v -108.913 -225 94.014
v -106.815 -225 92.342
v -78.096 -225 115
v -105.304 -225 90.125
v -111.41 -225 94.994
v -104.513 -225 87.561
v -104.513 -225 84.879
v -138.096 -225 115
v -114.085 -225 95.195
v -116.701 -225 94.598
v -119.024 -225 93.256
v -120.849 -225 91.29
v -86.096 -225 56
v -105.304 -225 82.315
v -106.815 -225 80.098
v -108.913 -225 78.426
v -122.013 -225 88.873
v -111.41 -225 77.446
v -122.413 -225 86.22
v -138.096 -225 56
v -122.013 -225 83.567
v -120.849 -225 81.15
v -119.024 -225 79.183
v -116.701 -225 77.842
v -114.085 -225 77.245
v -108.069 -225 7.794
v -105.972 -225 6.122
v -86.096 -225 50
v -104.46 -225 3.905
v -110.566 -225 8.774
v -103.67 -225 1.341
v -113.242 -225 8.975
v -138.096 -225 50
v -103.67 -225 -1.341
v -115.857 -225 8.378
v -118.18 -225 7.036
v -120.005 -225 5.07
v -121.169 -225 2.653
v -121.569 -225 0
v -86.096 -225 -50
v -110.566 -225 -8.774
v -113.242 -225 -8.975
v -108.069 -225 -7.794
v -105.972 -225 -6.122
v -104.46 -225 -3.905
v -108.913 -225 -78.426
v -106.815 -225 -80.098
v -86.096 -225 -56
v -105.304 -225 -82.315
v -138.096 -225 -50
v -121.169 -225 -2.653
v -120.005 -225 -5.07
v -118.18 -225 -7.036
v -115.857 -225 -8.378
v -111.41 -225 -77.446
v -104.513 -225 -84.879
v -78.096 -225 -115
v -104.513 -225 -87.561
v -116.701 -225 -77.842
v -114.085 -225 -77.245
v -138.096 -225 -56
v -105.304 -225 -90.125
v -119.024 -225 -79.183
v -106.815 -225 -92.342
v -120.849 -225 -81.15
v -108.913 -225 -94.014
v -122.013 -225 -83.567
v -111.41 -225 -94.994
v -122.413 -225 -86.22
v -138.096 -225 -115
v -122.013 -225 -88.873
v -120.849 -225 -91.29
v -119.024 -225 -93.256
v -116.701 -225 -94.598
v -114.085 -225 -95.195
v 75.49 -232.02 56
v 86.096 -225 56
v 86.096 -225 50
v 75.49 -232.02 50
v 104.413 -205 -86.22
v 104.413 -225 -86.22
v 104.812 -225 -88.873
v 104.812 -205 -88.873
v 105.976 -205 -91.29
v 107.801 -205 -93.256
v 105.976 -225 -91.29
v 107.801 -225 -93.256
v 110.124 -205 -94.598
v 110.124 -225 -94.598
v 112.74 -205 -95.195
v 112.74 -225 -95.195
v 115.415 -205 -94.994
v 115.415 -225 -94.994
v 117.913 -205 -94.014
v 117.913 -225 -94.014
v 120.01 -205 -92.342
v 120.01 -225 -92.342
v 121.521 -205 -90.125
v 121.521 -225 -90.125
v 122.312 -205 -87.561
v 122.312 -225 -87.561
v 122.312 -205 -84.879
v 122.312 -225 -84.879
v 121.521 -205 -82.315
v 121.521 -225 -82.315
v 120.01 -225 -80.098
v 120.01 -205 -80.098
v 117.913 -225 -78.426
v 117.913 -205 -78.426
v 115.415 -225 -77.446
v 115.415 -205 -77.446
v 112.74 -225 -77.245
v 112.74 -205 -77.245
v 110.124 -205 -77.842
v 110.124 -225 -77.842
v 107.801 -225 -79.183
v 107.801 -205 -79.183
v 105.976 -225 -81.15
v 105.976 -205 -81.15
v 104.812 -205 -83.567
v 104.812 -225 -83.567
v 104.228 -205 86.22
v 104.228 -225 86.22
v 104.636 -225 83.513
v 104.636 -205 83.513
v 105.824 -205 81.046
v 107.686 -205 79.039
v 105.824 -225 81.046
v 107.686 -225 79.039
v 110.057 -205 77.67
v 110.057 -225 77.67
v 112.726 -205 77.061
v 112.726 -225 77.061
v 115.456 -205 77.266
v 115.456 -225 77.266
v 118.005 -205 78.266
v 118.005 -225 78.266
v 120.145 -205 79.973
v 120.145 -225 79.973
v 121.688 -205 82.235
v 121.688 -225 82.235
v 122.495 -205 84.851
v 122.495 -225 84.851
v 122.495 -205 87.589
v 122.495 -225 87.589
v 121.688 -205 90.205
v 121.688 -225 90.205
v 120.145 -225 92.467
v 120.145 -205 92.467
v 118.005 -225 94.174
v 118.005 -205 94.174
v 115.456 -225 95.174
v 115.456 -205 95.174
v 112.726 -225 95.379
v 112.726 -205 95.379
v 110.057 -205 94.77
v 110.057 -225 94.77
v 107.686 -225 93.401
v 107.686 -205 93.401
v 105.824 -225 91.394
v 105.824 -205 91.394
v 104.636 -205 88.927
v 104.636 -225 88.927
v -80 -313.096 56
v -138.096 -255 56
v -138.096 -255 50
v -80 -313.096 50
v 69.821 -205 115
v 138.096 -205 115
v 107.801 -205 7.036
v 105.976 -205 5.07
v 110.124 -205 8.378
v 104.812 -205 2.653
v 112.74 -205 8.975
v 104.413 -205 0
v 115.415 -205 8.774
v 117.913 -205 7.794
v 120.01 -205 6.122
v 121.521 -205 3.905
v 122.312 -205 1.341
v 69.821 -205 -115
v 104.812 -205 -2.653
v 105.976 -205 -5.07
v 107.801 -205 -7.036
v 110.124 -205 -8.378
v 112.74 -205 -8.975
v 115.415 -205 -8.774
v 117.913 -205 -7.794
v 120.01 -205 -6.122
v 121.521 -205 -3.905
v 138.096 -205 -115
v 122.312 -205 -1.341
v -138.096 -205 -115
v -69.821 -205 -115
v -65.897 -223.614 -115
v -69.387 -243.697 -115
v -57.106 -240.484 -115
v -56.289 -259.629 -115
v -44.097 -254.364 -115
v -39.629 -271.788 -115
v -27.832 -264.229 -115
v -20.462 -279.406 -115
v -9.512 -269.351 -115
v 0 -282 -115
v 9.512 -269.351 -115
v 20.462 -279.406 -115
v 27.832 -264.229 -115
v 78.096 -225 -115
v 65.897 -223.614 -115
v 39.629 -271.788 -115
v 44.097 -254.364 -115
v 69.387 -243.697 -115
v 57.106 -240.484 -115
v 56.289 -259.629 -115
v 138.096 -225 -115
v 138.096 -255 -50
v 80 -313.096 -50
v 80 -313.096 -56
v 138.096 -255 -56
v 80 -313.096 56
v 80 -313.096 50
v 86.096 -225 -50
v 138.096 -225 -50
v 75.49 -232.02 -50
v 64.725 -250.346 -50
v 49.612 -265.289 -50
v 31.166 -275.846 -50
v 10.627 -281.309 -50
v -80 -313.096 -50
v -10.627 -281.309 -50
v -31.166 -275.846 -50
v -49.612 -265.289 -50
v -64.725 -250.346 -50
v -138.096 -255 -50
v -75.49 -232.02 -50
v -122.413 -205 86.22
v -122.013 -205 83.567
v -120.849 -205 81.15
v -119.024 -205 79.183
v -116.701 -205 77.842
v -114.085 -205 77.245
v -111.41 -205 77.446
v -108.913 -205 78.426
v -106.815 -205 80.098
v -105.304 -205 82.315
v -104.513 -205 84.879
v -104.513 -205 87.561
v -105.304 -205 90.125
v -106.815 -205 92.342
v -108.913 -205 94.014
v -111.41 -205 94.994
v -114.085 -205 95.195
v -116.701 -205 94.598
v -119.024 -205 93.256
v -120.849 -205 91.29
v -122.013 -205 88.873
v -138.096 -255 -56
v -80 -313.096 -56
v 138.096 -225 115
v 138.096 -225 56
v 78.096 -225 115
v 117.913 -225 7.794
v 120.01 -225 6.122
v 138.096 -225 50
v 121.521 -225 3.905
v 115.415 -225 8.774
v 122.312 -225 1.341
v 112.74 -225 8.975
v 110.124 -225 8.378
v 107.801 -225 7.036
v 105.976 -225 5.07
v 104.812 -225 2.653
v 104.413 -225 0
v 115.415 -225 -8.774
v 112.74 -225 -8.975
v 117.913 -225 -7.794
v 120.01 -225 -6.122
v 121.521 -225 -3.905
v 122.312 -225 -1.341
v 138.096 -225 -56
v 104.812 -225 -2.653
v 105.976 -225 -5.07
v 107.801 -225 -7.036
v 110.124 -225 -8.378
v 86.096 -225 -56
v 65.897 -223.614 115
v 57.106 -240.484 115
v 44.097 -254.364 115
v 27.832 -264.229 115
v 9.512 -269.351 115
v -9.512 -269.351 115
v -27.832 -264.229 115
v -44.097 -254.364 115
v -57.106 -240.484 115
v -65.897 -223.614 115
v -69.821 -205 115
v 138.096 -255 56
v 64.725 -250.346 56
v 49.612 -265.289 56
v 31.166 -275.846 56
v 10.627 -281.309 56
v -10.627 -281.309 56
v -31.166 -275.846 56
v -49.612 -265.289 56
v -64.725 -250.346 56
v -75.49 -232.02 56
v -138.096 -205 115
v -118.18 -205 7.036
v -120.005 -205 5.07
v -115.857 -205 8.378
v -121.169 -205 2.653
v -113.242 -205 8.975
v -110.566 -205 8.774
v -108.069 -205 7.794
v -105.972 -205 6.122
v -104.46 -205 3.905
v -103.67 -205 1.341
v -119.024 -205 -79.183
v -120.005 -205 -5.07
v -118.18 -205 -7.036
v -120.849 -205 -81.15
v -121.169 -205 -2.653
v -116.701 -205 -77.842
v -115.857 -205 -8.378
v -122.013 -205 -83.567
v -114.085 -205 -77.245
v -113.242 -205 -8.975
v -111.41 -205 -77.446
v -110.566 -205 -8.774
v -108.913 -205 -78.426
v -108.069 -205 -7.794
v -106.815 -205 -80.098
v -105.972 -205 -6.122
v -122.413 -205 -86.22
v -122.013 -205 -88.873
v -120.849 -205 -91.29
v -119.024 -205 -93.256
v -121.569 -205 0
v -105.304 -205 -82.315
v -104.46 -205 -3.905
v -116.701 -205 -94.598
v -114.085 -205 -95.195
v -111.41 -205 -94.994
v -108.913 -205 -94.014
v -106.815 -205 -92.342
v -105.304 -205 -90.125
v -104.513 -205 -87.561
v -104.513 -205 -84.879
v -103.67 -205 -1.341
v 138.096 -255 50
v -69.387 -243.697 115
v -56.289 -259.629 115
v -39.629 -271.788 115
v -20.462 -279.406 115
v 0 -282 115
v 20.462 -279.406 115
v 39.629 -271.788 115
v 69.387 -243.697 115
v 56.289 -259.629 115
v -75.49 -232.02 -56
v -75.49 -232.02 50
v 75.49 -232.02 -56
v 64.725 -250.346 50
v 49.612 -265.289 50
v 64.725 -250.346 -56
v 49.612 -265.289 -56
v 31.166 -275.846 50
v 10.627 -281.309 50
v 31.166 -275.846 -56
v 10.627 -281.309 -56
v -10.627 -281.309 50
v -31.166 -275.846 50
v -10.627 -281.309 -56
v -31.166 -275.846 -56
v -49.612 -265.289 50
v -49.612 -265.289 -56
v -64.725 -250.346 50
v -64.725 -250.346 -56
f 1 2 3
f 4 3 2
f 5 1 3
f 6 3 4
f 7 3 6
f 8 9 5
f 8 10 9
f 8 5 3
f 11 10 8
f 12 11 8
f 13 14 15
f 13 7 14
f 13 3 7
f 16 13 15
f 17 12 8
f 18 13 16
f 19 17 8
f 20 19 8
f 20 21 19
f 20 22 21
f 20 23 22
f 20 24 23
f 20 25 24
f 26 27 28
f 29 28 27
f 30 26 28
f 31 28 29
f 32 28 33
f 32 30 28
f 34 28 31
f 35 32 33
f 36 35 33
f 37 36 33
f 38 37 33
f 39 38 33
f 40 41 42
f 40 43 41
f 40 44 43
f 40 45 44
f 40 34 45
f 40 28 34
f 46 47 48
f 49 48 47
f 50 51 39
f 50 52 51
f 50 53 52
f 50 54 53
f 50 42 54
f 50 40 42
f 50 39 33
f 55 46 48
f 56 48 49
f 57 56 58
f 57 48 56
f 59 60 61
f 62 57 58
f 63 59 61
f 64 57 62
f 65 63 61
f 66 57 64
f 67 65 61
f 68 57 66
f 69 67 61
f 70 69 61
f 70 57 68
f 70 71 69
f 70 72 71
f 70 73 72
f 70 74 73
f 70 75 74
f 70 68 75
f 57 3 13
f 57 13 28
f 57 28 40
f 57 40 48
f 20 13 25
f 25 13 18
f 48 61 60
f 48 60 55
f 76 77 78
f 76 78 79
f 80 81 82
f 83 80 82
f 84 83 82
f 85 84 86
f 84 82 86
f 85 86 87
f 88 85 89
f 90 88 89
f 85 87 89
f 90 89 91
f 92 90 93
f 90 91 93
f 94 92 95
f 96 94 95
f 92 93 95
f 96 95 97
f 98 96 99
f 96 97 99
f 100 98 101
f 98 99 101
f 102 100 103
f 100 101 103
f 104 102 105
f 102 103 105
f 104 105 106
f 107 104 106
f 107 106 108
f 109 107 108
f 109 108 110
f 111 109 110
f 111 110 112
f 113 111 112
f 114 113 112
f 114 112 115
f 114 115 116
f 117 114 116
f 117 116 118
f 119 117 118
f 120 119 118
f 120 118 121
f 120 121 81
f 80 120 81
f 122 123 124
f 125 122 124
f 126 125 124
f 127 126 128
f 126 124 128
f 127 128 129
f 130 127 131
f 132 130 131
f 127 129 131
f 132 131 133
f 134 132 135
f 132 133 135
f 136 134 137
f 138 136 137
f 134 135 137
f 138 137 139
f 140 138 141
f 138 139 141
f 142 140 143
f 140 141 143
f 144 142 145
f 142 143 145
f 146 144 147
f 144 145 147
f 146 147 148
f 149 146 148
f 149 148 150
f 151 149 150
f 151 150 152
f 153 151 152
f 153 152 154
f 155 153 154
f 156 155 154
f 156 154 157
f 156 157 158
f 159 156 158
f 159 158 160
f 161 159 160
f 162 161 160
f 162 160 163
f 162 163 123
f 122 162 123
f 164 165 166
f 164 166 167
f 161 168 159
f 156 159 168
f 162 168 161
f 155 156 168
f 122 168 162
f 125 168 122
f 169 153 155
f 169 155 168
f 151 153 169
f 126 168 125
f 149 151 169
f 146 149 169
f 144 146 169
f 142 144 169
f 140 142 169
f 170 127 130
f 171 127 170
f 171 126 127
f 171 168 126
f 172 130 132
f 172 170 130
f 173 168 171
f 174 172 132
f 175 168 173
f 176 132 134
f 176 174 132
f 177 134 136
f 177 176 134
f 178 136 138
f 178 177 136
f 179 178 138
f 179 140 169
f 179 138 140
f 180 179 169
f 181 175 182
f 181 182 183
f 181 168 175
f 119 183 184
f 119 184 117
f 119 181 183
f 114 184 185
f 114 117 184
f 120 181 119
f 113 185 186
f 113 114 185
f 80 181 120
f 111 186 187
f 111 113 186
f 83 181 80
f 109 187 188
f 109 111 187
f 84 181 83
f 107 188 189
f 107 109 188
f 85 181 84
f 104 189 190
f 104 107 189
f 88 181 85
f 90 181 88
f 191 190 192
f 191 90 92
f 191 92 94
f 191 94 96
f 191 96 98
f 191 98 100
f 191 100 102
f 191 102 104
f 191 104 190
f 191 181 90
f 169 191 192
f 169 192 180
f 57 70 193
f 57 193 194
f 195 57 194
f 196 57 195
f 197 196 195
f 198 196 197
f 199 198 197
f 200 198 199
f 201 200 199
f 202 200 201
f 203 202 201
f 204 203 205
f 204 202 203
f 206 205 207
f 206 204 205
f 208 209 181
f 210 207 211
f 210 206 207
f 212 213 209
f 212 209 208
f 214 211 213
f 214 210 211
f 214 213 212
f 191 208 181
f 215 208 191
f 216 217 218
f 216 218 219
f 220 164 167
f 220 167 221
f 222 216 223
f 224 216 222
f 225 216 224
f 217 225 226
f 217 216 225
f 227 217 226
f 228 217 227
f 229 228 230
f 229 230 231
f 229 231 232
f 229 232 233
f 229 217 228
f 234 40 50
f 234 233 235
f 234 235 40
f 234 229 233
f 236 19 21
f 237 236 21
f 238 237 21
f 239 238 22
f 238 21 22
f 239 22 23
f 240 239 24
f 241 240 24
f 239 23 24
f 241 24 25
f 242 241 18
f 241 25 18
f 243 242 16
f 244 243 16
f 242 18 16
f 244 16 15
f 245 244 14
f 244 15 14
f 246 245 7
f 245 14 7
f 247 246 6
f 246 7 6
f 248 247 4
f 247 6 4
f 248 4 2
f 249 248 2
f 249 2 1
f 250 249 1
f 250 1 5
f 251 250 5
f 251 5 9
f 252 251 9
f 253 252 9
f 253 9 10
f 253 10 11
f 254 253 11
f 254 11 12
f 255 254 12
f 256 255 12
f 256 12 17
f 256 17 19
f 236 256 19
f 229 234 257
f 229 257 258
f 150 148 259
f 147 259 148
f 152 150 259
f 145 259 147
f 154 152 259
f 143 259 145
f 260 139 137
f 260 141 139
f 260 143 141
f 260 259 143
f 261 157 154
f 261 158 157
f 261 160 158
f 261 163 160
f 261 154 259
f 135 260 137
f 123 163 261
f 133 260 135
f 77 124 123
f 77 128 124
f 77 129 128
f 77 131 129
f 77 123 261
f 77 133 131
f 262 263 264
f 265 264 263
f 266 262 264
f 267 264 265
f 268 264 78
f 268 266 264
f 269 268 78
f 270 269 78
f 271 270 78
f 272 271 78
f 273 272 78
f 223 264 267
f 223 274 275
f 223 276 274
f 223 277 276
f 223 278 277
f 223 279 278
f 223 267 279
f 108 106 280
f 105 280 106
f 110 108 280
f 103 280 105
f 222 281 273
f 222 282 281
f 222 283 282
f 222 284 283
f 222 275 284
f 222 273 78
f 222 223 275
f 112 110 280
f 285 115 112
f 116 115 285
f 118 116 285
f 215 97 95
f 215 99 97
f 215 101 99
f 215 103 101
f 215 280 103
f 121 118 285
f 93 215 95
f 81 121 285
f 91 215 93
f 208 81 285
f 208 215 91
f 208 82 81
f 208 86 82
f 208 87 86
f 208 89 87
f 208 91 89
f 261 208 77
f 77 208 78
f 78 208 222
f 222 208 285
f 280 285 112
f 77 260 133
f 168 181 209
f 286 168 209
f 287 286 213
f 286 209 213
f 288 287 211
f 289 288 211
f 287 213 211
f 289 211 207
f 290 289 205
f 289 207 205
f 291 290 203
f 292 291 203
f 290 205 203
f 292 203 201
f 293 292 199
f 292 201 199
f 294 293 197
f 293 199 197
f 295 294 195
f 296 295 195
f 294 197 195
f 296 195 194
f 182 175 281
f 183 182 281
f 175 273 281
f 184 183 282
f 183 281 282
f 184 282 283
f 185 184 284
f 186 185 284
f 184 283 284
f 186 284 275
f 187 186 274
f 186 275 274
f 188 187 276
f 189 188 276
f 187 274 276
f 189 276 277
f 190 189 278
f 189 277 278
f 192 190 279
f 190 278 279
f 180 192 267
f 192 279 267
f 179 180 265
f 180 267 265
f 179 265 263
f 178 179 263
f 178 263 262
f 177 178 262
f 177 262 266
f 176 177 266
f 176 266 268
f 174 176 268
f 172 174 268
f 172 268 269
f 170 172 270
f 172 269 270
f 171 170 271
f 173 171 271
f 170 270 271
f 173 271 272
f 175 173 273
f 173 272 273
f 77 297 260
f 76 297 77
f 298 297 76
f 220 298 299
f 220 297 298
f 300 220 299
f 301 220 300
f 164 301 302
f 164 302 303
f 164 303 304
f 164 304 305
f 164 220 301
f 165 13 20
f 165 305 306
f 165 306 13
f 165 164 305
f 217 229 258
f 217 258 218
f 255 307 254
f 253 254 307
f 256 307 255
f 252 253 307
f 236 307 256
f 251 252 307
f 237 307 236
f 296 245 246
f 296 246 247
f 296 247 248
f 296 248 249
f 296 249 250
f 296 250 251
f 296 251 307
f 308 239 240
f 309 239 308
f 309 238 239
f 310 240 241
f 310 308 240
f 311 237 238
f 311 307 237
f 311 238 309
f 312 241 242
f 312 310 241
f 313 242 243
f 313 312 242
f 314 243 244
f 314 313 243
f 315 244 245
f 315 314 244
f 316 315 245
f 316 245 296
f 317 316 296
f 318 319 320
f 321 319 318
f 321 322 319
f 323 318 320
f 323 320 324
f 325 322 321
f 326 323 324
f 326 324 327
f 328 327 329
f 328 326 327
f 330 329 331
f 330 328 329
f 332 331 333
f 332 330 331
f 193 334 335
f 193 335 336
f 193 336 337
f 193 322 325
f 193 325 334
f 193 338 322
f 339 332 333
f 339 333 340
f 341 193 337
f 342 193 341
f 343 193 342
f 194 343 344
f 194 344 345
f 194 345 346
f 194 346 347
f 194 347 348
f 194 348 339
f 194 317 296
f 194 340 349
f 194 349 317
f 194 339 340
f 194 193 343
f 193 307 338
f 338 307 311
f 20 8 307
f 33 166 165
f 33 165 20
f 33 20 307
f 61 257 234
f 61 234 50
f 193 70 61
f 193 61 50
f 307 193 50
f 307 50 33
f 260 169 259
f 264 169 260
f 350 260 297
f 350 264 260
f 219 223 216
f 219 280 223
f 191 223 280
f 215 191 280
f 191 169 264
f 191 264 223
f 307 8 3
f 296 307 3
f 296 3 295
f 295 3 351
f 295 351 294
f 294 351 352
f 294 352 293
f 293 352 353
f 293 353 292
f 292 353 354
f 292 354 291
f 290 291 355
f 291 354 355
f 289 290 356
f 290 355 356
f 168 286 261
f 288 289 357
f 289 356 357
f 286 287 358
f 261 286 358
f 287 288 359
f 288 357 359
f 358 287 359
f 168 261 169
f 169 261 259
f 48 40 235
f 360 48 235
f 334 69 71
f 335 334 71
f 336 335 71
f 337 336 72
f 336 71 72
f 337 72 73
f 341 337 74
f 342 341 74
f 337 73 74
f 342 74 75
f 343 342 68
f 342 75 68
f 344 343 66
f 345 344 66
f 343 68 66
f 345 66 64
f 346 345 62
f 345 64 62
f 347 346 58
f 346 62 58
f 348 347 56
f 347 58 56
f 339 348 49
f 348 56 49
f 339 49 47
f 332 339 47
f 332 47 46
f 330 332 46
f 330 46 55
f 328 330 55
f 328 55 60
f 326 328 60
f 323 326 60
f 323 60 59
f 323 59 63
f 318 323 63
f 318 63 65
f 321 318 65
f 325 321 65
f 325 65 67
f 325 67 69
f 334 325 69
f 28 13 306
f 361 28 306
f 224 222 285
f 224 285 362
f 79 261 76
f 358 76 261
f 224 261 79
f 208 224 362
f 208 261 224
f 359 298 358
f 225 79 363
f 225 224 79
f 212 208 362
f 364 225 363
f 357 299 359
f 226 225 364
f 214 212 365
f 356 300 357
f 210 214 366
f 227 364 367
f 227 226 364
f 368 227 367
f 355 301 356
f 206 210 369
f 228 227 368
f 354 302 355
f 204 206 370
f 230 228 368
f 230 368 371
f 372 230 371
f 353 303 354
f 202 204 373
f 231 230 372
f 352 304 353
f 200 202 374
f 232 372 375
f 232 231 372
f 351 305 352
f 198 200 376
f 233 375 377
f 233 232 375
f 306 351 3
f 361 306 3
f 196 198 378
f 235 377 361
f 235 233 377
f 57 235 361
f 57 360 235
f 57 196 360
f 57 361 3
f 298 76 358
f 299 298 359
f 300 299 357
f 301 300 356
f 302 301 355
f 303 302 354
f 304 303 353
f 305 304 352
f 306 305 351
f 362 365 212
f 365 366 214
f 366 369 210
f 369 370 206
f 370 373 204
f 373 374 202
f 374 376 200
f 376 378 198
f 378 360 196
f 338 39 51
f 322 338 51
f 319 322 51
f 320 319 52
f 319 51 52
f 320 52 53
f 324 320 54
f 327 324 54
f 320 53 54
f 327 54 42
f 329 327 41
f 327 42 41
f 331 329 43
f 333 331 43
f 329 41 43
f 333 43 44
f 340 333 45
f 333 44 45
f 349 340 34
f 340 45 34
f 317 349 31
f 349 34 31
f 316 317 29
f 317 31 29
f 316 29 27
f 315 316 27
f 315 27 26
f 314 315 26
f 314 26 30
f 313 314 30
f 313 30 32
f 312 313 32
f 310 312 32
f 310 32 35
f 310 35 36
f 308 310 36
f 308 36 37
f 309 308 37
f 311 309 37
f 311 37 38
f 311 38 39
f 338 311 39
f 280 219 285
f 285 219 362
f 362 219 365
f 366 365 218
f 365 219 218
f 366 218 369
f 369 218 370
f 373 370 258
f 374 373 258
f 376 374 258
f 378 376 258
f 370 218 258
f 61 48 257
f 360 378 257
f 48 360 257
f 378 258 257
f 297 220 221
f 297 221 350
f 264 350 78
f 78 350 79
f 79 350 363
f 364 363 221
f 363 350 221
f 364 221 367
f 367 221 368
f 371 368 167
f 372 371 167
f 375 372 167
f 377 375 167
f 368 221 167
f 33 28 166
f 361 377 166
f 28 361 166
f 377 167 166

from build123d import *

# Parameters (mm, degrees)
EXTRUDE002_DEPTH         = 6
SKETCH003_R              = 9
SKETCH003_R_2            = 9.18475
EXTRUDE003_DEPTH         = 30
EXTRUDE001_DEPTH         = 115
CLONE002_PLACEMENT_ANGLE = 180


with BuildPart() as extrude002:
    # Sketch002 → Extrude002 (new body)
    with BuildSketch(Plane.XY):
        with BuildLine():
            Line((-138.096095, -175), (-138.096095, -145))
            Line((-138.096095, -145), (-80, -86.903905))
            Line((-80, -86.903905), (80, -86.903905))
            Line((80, -86.903905), (138.096095, -145))
            Line((138.096095, -145), (138.096095, -175))
            Line((138.096095, -175), (86.096095, -175))
            Line((86.096095, -175), (74.344944, -167.222083))
            ThreePointArc((74.344944, -167.222083), (0, -118.75), (-74.344944, -167.222083))
            Line((-86.096095, -175), (-74.344944, -167.222083))
            Line((-138.096095, -175), (-86.096095, -175))
        make_face()
    extrude(amount=EXTRUDE002_DEPTH)


with BuildPart() as extrude002_1:
    # Extrude002 placement: moved
    add(extrude002.part.moved(Location((0, 0, 50))))


with BuildPart() as loch:
    # Sketch003 (on Face3 of Extrude001) → Extrude003 (new body, symmetric)
    with BuildSketch(Plane(origin=(0, -175, 0), x_dir=(-1, 0, 0), z_dir=(0, 1, 0))):
        with Locations((-113.412567, 86.219978)):
            Circle(SKETCH003_R)
        with Locations((-113.412567, -86.219978)):
            Circle(SKETCH003_R_2)
        with Locations((113.412567, -86.219978)):
            Circle(SKETCH003_R)
        with Locations((113.412567, 86.219978)):
            Circle(SKETCH003_R)
        with Locations((112.569069, 0)):
            Circle(SKETCH003_R)
        with Locations((-113.412567, 0)):
            Circle(SKETCH003_R)
    extrude(amount=EXTRUDE003_DEPTH, both=True)


with BuildPart() as cut:
    # Sketch001 → Extrude001 (new body, symmetric)
    with BuildSketch(Plane.XY):
        with BuildLine():
            ThreePointArc((78.096095, -175), (0, -118), (-78.096095, -175))
            Line((-78.096095, -175), (-138.096095, -175))
            Line((-138.096095, -175), (-138.096095, -195))
            Line((-138.096095, -195), (-69.8212, -195))
            ThreePointArc((69.8212, -195), (0, -130), (-69.8212, -195))
            Line((69.8212, -195), (138.096095, -195))
            Line((138.096095, -195), (138.096095, -175))
            Line((138.096095, -175), (78.096095, -175))
        make_face()
    extrude(amount=EXTRUDE001_DEPTH, both=True)

    # Cut: cut Loch
    add(loch.part, mode=Mode.SUBTRACT)


with BuildPart() as schelle001:
    # Clone001 base: copy of Extrude002
    add(extrude002_1.part)


with BuildPart() as schelle001_1:
    # Clone001 placement: moved
    add(schelle001.part.moved(Location((0, 0, -106))))

    # Fusion: union Extrude002, Cut
    add(extrude002_1.part)
    add(cut.part)


with BuildPart() as schelle001_2:
    # Clone002 placement: moved
    add(schelle001_1.part.moved(Location((0, -400, 0))).rotate(Axis((0, -400, 0), (1, 0, 0)), CLONE002_PLACEMENT_ANGLE))


solid = schelle001_2.part
